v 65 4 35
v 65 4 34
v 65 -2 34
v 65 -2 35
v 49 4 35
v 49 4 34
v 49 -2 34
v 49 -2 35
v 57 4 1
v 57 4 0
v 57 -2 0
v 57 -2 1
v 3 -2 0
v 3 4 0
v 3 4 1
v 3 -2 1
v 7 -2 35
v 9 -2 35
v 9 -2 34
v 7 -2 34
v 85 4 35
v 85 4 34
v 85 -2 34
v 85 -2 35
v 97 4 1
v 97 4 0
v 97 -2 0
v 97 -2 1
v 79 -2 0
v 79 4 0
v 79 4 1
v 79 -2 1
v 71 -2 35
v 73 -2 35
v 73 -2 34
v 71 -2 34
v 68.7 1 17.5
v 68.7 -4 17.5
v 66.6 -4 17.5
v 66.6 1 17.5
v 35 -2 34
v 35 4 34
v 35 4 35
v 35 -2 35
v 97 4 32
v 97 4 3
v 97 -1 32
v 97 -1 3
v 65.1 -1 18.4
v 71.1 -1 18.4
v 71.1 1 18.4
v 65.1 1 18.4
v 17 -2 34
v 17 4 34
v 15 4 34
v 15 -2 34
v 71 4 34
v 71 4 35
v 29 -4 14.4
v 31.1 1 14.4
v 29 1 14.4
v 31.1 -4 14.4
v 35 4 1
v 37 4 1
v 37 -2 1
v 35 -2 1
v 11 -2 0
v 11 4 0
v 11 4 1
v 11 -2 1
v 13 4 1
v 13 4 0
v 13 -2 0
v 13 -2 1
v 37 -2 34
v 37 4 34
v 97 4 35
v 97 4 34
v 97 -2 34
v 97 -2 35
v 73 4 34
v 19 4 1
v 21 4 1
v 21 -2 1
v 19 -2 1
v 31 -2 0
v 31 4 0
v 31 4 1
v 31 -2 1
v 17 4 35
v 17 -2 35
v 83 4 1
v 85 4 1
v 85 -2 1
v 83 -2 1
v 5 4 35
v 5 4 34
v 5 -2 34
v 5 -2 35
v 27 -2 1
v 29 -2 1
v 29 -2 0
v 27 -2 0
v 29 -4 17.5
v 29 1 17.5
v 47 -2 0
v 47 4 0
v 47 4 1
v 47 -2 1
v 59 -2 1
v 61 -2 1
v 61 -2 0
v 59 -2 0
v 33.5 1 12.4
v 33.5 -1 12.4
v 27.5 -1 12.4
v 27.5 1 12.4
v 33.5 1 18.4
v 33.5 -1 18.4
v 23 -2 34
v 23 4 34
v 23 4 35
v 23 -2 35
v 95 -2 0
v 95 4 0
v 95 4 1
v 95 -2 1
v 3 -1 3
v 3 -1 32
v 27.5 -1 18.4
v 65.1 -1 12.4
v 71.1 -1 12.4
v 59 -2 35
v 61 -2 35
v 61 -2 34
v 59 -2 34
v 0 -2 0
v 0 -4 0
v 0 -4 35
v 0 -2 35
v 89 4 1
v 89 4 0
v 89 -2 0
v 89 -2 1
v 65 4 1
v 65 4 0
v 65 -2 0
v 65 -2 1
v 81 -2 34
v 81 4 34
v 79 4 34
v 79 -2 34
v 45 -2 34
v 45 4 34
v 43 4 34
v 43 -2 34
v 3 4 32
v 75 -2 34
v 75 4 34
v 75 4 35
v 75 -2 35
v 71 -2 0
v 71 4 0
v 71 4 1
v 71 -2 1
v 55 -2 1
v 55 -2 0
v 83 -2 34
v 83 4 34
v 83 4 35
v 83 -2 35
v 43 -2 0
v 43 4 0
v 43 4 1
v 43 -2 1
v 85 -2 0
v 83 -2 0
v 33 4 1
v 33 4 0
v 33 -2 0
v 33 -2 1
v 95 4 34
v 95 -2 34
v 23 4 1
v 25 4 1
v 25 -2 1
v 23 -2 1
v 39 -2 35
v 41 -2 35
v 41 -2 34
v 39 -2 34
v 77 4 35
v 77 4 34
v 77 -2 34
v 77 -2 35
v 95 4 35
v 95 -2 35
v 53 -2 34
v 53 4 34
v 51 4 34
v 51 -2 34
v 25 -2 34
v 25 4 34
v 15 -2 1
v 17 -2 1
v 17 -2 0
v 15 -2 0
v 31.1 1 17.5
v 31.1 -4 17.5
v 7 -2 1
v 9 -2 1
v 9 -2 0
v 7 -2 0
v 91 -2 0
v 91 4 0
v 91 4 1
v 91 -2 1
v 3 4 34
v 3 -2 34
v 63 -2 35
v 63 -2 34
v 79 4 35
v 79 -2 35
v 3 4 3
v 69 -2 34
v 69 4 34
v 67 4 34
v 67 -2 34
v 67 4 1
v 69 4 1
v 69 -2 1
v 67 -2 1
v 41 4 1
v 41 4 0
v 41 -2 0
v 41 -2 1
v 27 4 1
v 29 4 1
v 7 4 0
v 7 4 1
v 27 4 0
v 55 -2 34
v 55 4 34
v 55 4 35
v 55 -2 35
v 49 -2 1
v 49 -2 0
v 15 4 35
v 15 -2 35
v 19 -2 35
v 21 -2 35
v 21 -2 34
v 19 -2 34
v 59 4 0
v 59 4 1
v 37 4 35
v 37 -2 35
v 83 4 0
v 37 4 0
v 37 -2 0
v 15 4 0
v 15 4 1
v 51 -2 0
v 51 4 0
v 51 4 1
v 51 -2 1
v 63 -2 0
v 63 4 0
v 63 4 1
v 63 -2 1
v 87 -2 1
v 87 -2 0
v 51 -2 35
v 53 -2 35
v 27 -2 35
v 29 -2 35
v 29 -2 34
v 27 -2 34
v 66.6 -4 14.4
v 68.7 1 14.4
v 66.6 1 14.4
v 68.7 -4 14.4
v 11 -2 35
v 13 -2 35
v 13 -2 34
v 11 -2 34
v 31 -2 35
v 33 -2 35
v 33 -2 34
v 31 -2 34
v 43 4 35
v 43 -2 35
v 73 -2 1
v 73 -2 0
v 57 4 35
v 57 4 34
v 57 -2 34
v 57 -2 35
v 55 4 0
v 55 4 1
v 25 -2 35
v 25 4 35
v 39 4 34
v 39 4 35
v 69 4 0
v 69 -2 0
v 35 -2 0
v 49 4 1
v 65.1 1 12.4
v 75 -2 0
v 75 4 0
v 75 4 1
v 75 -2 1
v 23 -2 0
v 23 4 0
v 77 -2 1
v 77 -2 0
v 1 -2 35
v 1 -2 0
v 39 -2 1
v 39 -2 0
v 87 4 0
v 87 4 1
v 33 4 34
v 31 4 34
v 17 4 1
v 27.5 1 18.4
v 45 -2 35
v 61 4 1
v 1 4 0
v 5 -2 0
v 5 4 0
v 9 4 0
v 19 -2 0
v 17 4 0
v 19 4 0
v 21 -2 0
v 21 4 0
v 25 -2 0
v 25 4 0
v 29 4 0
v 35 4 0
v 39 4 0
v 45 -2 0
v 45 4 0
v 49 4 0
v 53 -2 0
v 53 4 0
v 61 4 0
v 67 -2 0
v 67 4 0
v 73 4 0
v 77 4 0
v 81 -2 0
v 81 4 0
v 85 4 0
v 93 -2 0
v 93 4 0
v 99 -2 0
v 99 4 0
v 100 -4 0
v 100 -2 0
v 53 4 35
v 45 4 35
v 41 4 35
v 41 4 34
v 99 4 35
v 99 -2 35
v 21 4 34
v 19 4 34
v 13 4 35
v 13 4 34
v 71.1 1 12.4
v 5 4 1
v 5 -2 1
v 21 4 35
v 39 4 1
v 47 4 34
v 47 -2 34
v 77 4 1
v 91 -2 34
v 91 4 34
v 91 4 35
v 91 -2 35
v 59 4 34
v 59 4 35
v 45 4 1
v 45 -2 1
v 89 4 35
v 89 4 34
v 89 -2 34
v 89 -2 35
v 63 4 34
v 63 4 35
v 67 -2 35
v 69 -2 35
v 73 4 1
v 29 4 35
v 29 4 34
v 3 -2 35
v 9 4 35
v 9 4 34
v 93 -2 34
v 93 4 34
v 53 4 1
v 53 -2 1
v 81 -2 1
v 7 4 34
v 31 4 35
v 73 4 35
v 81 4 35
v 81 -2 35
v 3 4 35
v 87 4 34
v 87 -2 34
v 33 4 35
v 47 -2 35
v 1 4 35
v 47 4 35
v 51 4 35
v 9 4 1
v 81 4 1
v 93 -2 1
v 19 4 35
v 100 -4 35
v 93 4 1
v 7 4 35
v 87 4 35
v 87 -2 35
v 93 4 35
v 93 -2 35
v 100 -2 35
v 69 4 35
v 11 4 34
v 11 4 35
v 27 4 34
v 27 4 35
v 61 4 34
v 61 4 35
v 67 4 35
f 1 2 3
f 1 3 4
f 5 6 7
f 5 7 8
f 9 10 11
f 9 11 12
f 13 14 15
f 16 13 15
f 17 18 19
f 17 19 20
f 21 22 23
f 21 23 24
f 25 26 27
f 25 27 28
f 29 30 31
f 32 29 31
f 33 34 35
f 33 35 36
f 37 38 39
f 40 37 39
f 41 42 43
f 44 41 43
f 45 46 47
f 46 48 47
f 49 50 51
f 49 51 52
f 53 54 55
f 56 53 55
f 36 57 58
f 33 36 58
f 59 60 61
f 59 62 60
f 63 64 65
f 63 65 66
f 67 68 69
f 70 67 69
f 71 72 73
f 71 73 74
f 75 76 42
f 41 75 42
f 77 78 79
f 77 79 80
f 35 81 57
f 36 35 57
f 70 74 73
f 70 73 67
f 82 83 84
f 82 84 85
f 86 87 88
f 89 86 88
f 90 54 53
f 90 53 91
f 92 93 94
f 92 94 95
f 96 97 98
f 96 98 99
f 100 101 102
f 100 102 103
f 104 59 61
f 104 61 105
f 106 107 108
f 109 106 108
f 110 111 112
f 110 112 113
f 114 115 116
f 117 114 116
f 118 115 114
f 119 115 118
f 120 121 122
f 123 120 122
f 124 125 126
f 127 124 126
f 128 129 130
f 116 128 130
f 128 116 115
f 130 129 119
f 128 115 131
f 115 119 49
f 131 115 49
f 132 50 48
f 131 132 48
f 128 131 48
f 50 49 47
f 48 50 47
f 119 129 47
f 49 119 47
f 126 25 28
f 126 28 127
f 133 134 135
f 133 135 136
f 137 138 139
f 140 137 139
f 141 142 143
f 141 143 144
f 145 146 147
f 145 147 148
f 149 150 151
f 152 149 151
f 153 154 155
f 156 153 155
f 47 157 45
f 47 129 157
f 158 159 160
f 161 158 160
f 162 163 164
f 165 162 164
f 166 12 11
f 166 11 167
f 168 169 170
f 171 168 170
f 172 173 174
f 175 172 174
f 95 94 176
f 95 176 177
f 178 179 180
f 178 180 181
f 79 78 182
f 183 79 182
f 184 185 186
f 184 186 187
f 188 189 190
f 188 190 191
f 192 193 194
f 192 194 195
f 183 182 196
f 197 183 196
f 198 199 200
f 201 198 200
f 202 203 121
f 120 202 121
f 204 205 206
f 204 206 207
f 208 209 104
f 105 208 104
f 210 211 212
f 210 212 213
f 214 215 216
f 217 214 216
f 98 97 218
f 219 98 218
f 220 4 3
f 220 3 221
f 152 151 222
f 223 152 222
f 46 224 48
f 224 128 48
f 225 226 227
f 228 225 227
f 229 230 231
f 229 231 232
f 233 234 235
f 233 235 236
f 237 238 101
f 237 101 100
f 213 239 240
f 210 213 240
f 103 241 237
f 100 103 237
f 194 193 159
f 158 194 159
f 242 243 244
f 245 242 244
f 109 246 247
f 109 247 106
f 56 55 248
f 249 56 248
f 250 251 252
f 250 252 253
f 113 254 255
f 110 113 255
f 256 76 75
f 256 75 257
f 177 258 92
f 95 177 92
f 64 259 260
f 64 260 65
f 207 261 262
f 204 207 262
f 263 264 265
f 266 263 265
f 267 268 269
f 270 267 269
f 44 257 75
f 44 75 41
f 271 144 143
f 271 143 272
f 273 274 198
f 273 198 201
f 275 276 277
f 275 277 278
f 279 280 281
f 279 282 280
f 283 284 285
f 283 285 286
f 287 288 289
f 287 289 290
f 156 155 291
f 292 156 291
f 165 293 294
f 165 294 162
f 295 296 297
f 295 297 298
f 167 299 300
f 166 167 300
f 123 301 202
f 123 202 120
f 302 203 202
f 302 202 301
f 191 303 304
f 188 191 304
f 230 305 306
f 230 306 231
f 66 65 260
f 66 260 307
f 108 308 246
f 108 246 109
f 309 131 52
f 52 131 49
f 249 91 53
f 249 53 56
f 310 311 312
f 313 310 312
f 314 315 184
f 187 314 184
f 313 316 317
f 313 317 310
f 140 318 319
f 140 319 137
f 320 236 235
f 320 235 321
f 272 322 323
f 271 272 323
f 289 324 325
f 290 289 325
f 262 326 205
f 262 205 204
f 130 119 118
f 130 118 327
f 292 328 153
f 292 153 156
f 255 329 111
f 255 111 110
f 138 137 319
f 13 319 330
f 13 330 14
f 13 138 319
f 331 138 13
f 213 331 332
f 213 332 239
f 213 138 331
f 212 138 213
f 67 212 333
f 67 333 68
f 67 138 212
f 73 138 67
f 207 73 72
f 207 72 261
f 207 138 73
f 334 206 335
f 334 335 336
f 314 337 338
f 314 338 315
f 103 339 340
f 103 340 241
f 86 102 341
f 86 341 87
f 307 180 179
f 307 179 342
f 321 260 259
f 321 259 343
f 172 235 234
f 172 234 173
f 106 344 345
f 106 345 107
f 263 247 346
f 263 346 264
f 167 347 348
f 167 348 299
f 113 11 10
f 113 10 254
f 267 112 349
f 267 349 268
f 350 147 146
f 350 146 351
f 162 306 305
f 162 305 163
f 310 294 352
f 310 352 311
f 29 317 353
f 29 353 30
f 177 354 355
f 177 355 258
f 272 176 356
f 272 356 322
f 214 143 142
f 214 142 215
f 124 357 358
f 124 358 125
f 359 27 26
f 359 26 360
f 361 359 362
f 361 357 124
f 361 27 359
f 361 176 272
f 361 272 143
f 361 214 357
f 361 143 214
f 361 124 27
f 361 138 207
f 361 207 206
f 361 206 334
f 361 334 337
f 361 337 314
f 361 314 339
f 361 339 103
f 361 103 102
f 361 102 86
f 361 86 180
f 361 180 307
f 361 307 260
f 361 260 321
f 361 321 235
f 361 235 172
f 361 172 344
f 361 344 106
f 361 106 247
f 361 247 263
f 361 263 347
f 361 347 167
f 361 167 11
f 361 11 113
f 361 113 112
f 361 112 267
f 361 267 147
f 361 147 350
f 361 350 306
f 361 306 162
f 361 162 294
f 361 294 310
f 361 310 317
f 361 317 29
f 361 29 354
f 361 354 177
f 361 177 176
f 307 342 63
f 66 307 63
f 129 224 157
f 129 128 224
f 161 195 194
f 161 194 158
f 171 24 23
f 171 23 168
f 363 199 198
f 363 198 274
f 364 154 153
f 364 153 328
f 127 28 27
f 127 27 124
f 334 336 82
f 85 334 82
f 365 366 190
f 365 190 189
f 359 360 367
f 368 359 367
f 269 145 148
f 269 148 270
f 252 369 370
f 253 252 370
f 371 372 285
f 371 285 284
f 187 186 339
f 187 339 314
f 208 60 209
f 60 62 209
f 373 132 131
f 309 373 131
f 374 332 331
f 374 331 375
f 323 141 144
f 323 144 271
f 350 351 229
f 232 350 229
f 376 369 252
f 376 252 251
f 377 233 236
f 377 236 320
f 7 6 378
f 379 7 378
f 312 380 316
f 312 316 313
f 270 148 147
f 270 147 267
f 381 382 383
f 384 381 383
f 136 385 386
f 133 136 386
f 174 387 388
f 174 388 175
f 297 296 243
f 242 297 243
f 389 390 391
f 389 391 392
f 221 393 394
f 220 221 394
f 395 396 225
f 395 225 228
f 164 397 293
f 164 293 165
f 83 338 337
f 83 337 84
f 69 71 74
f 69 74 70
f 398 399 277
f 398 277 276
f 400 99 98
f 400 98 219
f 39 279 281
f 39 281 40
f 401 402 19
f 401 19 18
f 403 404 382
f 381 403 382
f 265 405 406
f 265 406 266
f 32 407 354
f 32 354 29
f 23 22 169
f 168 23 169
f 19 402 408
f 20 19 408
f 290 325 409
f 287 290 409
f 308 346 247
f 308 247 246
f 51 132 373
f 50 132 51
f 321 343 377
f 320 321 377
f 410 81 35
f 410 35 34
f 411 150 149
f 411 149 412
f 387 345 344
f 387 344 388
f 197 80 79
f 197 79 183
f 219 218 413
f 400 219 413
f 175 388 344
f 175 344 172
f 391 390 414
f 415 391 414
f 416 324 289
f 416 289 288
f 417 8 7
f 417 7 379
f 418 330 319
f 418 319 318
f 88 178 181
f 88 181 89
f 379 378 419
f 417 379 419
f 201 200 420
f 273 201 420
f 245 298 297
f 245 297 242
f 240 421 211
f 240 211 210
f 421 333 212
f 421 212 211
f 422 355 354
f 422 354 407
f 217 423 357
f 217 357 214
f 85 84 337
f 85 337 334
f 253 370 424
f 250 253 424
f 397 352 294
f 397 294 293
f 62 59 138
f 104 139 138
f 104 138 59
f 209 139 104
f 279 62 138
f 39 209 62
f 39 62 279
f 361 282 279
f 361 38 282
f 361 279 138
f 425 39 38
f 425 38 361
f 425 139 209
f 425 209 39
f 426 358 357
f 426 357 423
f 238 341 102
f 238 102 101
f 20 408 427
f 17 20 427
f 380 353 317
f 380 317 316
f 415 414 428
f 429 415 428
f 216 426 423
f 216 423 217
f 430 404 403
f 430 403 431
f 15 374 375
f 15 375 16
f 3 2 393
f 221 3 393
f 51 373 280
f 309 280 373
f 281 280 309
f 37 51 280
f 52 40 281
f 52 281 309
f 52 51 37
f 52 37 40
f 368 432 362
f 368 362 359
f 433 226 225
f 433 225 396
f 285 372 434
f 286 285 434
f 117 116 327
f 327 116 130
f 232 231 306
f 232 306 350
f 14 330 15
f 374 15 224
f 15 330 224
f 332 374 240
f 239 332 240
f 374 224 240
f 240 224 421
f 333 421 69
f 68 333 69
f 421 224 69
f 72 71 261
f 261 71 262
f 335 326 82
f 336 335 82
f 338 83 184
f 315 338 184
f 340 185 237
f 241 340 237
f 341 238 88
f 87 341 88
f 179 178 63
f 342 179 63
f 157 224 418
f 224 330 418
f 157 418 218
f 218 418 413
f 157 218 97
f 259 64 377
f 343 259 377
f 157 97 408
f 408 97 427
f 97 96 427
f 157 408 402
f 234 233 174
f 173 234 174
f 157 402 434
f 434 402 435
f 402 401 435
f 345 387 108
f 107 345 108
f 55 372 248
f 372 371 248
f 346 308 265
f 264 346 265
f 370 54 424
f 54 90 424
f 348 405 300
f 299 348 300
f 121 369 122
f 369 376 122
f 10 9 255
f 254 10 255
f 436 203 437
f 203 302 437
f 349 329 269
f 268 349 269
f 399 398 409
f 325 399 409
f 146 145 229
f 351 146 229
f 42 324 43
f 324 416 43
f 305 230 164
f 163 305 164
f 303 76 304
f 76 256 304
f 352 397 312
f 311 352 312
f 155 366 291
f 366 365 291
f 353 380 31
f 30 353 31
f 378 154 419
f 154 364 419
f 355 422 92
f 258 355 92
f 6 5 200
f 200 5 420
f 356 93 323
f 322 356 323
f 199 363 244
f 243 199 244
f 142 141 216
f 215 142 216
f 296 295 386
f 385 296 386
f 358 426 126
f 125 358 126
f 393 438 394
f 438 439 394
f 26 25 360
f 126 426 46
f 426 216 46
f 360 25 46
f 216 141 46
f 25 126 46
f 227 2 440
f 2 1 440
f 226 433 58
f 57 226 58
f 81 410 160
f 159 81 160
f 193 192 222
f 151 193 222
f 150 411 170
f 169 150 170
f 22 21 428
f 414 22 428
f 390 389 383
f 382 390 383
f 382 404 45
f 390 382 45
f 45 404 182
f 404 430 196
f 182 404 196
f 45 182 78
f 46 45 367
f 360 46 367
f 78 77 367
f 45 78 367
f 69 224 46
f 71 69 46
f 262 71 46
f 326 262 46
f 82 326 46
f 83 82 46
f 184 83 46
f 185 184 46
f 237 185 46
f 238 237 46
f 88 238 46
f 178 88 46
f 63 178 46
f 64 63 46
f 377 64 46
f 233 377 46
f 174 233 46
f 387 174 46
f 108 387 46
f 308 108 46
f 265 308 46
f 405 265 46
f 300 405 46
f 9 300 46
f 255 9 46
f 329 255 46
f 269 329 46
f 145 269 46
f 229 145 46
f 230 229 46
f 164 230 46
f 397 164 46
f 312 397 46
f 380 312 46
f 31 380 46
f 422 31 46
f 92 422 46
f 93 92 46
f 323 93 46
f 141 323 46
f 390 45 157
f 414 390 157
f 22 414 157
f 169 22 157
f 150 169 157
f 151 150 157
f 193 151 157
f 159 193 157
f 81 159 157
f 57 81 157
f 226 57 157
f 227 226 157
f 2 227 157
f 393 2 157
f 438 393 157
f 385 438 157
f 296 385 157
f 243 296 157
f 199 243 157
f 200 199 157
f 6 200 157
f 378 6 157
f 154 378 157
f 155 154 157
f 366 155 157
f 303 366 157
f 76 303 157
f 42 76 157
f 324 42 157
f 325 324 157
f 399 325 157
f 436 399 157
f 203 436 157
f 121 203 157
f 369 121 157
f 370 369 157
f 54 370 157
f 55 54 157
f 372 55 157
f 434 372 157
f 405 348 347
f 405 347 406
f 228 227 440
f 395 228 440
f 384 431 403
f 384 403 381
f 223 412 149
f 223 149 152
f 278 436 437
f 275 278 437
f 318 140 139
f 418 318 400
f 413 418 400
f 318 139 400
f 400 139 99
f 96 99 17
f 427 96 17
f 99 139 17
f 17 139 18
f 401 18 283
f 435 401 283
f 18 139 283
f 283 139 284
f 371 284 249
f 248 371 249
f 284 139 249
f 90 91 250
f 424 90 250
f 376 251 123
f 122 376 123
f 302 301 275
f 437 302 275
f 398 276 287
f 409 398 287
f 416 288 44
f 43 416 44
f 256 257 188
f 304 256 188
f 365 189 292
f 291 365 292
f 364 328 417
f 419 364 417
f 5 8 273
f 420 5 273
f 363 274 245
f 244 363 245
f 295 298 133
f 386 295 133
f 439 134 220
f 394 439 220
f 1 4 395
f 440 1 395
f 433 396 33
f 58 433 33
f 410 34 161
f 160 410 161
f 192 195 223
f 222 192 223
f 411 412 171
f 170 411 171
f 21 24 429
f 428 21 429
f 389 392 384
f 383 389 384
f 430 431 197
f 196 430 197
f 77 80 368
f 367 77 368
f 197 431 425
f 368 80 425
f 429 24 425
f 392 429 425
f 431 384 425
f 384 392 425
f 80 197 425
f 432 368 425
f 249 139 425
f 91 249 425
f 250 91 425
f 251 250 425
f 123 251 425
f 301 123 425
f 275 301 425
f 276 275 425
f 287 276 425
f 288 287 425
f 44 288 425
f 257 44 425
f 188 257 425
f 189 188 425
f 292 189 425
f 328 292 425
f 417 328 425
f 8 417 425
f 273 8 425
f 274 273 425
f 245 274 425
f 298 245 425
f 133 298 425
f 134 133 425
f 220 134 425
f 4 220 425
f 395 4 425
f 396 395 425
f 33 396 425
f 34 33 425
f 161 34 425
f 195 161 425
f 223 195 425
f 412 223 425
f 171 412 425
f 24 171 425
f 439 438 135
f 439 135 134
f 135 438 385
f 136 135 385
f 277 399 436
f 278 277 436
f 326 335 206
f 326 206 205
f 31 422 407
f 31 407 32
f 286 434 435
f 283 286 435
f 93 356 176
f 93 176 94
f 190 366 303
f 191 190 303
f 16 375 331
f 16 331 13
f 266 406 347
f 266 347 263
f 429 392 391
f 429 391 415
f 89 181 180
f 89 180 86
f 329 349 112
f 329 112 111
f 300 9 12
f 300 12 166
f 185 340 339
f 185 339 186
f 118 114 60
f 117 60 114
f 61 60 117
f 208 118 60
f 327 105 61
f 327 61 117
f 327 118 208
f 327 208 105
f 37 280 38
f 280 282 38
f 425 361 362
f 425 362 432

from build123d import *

# Parameters (mm, degrees)
F0_W      = 100
F0_H      = 35
F1_DEPTH  = 4
F2_T      = -3
F3_W      = 1
F3_H      = 35
F4_DEPTH  = 6
F5_W      = 2
F5_H      = 1
F6_DEPTH  = 6
F7_W      = 2.1
F7_H      = 3.1
F8_DEPTH  = 3
F9_W      = 6
F9_H      = 6
F9_W_2    = 2.1
F9_H_2    = 3.1
F10_DEPTH = 2


with BuildPart() as f1:
    # F0 (on Front) → F1 (new body, symmetric)
    with BuildSketch(Plane.XZ):
        with Locations((50, 17.5)):
            Rectangle(F0_W, F0_H)
    extrude(amount=F1_DEPTH, both=True)

    # F2
    f2_openings = [f1.faces().sort_by_distance(p)[0] for p in [
        (50, 4, 17.5),
    ]]
    offset(amount=F2_T, openings=f2_openings)

    # F3 (on face) → F4 (cut)
    with BuildSketch(Plane(origin=(0, 4, 0), x_dir=(-1, 0, 0), z_dir=(0, 1, 0))):
        with Locations((-99.5, 17.5)):
            Rectangle(F3_W, F3_H)
        with Locations((-0.5, 17.5)):
            Rectangle(F3_W, F3_H)
    extrude(amount=-F4_DEPTH, mode=Mode.SUBTRACT)

    # F5 (on face) → F6 (cut)
    with BuildSketch(Plane(origin=(0, 4, 0), x_dir=(-1, 0, 0), z_dir=(0, 1, 0))):
        with Locations((-96, 34.5)):
            Rectangle(F5_W, F5_H)
        with Locations((-96, 0.5)):
            Rectangle(F5_W, F5_H)
        with Locations((-92, 34.5)):
            Rectangle(F5_W, F5_H)
        with Locations((-92, 0.5)):
            Rectangle(F5_W, F5_H)
        with Locations((-88, 34.5)):
            Rectangle(F5_W, F5_H)
        with Locations((-88, 0.5)):
            Rectangle(F5_W, F5_H)
        with Locations((-84, 34.5)):
            Rectangle(F5_W, F5_H)
        with Locations((-84, 0.5)):
            Rectangle(F5_W, F5_H)
        with Locations((-80, 34.5)):
            Rectangle(F5_W, F5_H)
        with Locations((-80, 0.5)):
            Rectangle(F5_W, F5_H)
        with Locations((-76, 34.5)):
            Rectangle(F5_W, F5_H)
        with Locations((-76, 0.5)):
            Rectangle(F5_W, F5_H)
        with Locations((-72, 34.5)):
            Rectangle(F5_W, F5_H)
        with Locations((-72, 0.5)):
            Rectangle(F5_W, F5_H)
        with Locations((-68, 34.5)):
            Rectangle(F5_W, F5_H)
        with Locations((-68, 0.5)):
            Rectangle(F5_W, F5_H)
        with Locations((-64, 34.5)):
            Rectangle(F5_W, F5_H)
        with Locations((-64, 0.5)):
            Rectangle(F5_W, F5_H)
        with Locations((-60, 34.5)):
            Rectangle(F5_W, F5_H)
        with Locations((-60, 0.5)):
            Rectangle(F5_W, F5_H)
        with Locations((-56, 34.5)):
            Rectangle(F5_W, F5_H)
        with Locations((-56, 0.5)):
            Rectangle(F5_W, F5_H)
        with Locations((-52, 34.5)):
            Rectangle(F5_W, F5_H)
        with Locations((-52, 0.5)):
            Rectangle(F5_W, F5_H)
        with Locations((-48, 34.5)):
            Rectangle(F5_W, F5_H)
        with Locations((-48, 0.5)):
            Rectangle(F5_W, F5_H)
        with Locations((-44, 34.5)):
            Rectangle(F5_W, F5_H)
        with Locations((-44, 0.5)):
            Rectangle(F5_W, F5_H)
        with Locations((-40, 34.5)):
            Rectangle(F5_W, F5_H)
        with Locations((-40, 0.5)):
            Rectangle(F5_W, F5_H)
        with Locations((-36, 34.5)):
            Rectangle(F5_W, F5_H)
        with Locations((-36, 0.5)):
            Rectangle(F5_W, F5_H)
        with Locations((-32, 34.5)):
            Rectangle(F5_W, F5_H)
        with Locations((-32, 0.5)):
            Rectangle(F5_W, F5_H)
        with Locations((-28, 34.5)):
            Rectangle(F5_W, F5_H)
        with Locations((-28, 0.5)):
            Rectangle(F5_W, F5_H)
        with Locations((-24, 34.5)):
            Rectangle(F5_W, F5_H)
        with Locations((-24, 0.5)):
            Rectangle(F5_W, F5_H)
        with Locations((-20, 34.5)):
            Rectangle(F5_W, F5_H)
        with Locations((-20, 0.5)):
            Rectangle(F5_W, F5_H)
        with Locations((-16, 34.5)):
            Rectangle(F5_W, F5_H)
        with Locations((-16, 0.5)):
            Rectangle(F5_W, F5_H)
        with Locations((-12, 34.5)):
            Rectangle(F5_W, F5_H)
        with Locations((-12, 0.5)):
            Rectangle(F5_W, F5_H)
        with Locations((-8, 34.5)):
            Rectangle(F5_W, F5_H)
        with Locations((-8, 0.5)):
            Rectangle(F5_W, F5_H)
        with Locations((-4, 34.5)):
            Rectangle(F5_W, F5_H)
        with Locations((-4, 0.5)):
            Rectangle(F5_W, F5_H)
    extrude(amount=-F6_DEPTH, mode=Mode.SUBTRACT)

    # F7 (on face) → F8 (cut)
    with BuildSketch(Plane.XZ.offset(4)):
        with Locations((67.65, 15.95)):
            Rectangle(F7_W, F7_H)
        with Locations((30.05, 15.95)):
            Rectangle(F7_W, F7_H)
    extrude(amount=-F8_DEPTH, mode=Mode.SUBTRACT)

    # F9 (on face) → F10 (join)
    with BuildSketch(Plane(origin=(0, -1, 0), x_dir=(-1, 0, 0), z_dir=(0, 1, 0))):
        with Locations((-68.1, 15.4)):
            Rectangle(F9_W, F9_H)
        with Locations((-67.65, 15.95)):
            Rectangle(F9_W_2, F9_H_2, mode=Mode.SUBTRACT)
        with Locations((-30.5, 15.4)):
            Rectangle(F9_W, F9_H)
        with Locations((-30.05, 15.95)):
            Rectangle(F9_W_2, F9_H_2, mode=Mode.SUBTRACT)
    extrude(amount=F10_DEPTH)


solid = f1.part
